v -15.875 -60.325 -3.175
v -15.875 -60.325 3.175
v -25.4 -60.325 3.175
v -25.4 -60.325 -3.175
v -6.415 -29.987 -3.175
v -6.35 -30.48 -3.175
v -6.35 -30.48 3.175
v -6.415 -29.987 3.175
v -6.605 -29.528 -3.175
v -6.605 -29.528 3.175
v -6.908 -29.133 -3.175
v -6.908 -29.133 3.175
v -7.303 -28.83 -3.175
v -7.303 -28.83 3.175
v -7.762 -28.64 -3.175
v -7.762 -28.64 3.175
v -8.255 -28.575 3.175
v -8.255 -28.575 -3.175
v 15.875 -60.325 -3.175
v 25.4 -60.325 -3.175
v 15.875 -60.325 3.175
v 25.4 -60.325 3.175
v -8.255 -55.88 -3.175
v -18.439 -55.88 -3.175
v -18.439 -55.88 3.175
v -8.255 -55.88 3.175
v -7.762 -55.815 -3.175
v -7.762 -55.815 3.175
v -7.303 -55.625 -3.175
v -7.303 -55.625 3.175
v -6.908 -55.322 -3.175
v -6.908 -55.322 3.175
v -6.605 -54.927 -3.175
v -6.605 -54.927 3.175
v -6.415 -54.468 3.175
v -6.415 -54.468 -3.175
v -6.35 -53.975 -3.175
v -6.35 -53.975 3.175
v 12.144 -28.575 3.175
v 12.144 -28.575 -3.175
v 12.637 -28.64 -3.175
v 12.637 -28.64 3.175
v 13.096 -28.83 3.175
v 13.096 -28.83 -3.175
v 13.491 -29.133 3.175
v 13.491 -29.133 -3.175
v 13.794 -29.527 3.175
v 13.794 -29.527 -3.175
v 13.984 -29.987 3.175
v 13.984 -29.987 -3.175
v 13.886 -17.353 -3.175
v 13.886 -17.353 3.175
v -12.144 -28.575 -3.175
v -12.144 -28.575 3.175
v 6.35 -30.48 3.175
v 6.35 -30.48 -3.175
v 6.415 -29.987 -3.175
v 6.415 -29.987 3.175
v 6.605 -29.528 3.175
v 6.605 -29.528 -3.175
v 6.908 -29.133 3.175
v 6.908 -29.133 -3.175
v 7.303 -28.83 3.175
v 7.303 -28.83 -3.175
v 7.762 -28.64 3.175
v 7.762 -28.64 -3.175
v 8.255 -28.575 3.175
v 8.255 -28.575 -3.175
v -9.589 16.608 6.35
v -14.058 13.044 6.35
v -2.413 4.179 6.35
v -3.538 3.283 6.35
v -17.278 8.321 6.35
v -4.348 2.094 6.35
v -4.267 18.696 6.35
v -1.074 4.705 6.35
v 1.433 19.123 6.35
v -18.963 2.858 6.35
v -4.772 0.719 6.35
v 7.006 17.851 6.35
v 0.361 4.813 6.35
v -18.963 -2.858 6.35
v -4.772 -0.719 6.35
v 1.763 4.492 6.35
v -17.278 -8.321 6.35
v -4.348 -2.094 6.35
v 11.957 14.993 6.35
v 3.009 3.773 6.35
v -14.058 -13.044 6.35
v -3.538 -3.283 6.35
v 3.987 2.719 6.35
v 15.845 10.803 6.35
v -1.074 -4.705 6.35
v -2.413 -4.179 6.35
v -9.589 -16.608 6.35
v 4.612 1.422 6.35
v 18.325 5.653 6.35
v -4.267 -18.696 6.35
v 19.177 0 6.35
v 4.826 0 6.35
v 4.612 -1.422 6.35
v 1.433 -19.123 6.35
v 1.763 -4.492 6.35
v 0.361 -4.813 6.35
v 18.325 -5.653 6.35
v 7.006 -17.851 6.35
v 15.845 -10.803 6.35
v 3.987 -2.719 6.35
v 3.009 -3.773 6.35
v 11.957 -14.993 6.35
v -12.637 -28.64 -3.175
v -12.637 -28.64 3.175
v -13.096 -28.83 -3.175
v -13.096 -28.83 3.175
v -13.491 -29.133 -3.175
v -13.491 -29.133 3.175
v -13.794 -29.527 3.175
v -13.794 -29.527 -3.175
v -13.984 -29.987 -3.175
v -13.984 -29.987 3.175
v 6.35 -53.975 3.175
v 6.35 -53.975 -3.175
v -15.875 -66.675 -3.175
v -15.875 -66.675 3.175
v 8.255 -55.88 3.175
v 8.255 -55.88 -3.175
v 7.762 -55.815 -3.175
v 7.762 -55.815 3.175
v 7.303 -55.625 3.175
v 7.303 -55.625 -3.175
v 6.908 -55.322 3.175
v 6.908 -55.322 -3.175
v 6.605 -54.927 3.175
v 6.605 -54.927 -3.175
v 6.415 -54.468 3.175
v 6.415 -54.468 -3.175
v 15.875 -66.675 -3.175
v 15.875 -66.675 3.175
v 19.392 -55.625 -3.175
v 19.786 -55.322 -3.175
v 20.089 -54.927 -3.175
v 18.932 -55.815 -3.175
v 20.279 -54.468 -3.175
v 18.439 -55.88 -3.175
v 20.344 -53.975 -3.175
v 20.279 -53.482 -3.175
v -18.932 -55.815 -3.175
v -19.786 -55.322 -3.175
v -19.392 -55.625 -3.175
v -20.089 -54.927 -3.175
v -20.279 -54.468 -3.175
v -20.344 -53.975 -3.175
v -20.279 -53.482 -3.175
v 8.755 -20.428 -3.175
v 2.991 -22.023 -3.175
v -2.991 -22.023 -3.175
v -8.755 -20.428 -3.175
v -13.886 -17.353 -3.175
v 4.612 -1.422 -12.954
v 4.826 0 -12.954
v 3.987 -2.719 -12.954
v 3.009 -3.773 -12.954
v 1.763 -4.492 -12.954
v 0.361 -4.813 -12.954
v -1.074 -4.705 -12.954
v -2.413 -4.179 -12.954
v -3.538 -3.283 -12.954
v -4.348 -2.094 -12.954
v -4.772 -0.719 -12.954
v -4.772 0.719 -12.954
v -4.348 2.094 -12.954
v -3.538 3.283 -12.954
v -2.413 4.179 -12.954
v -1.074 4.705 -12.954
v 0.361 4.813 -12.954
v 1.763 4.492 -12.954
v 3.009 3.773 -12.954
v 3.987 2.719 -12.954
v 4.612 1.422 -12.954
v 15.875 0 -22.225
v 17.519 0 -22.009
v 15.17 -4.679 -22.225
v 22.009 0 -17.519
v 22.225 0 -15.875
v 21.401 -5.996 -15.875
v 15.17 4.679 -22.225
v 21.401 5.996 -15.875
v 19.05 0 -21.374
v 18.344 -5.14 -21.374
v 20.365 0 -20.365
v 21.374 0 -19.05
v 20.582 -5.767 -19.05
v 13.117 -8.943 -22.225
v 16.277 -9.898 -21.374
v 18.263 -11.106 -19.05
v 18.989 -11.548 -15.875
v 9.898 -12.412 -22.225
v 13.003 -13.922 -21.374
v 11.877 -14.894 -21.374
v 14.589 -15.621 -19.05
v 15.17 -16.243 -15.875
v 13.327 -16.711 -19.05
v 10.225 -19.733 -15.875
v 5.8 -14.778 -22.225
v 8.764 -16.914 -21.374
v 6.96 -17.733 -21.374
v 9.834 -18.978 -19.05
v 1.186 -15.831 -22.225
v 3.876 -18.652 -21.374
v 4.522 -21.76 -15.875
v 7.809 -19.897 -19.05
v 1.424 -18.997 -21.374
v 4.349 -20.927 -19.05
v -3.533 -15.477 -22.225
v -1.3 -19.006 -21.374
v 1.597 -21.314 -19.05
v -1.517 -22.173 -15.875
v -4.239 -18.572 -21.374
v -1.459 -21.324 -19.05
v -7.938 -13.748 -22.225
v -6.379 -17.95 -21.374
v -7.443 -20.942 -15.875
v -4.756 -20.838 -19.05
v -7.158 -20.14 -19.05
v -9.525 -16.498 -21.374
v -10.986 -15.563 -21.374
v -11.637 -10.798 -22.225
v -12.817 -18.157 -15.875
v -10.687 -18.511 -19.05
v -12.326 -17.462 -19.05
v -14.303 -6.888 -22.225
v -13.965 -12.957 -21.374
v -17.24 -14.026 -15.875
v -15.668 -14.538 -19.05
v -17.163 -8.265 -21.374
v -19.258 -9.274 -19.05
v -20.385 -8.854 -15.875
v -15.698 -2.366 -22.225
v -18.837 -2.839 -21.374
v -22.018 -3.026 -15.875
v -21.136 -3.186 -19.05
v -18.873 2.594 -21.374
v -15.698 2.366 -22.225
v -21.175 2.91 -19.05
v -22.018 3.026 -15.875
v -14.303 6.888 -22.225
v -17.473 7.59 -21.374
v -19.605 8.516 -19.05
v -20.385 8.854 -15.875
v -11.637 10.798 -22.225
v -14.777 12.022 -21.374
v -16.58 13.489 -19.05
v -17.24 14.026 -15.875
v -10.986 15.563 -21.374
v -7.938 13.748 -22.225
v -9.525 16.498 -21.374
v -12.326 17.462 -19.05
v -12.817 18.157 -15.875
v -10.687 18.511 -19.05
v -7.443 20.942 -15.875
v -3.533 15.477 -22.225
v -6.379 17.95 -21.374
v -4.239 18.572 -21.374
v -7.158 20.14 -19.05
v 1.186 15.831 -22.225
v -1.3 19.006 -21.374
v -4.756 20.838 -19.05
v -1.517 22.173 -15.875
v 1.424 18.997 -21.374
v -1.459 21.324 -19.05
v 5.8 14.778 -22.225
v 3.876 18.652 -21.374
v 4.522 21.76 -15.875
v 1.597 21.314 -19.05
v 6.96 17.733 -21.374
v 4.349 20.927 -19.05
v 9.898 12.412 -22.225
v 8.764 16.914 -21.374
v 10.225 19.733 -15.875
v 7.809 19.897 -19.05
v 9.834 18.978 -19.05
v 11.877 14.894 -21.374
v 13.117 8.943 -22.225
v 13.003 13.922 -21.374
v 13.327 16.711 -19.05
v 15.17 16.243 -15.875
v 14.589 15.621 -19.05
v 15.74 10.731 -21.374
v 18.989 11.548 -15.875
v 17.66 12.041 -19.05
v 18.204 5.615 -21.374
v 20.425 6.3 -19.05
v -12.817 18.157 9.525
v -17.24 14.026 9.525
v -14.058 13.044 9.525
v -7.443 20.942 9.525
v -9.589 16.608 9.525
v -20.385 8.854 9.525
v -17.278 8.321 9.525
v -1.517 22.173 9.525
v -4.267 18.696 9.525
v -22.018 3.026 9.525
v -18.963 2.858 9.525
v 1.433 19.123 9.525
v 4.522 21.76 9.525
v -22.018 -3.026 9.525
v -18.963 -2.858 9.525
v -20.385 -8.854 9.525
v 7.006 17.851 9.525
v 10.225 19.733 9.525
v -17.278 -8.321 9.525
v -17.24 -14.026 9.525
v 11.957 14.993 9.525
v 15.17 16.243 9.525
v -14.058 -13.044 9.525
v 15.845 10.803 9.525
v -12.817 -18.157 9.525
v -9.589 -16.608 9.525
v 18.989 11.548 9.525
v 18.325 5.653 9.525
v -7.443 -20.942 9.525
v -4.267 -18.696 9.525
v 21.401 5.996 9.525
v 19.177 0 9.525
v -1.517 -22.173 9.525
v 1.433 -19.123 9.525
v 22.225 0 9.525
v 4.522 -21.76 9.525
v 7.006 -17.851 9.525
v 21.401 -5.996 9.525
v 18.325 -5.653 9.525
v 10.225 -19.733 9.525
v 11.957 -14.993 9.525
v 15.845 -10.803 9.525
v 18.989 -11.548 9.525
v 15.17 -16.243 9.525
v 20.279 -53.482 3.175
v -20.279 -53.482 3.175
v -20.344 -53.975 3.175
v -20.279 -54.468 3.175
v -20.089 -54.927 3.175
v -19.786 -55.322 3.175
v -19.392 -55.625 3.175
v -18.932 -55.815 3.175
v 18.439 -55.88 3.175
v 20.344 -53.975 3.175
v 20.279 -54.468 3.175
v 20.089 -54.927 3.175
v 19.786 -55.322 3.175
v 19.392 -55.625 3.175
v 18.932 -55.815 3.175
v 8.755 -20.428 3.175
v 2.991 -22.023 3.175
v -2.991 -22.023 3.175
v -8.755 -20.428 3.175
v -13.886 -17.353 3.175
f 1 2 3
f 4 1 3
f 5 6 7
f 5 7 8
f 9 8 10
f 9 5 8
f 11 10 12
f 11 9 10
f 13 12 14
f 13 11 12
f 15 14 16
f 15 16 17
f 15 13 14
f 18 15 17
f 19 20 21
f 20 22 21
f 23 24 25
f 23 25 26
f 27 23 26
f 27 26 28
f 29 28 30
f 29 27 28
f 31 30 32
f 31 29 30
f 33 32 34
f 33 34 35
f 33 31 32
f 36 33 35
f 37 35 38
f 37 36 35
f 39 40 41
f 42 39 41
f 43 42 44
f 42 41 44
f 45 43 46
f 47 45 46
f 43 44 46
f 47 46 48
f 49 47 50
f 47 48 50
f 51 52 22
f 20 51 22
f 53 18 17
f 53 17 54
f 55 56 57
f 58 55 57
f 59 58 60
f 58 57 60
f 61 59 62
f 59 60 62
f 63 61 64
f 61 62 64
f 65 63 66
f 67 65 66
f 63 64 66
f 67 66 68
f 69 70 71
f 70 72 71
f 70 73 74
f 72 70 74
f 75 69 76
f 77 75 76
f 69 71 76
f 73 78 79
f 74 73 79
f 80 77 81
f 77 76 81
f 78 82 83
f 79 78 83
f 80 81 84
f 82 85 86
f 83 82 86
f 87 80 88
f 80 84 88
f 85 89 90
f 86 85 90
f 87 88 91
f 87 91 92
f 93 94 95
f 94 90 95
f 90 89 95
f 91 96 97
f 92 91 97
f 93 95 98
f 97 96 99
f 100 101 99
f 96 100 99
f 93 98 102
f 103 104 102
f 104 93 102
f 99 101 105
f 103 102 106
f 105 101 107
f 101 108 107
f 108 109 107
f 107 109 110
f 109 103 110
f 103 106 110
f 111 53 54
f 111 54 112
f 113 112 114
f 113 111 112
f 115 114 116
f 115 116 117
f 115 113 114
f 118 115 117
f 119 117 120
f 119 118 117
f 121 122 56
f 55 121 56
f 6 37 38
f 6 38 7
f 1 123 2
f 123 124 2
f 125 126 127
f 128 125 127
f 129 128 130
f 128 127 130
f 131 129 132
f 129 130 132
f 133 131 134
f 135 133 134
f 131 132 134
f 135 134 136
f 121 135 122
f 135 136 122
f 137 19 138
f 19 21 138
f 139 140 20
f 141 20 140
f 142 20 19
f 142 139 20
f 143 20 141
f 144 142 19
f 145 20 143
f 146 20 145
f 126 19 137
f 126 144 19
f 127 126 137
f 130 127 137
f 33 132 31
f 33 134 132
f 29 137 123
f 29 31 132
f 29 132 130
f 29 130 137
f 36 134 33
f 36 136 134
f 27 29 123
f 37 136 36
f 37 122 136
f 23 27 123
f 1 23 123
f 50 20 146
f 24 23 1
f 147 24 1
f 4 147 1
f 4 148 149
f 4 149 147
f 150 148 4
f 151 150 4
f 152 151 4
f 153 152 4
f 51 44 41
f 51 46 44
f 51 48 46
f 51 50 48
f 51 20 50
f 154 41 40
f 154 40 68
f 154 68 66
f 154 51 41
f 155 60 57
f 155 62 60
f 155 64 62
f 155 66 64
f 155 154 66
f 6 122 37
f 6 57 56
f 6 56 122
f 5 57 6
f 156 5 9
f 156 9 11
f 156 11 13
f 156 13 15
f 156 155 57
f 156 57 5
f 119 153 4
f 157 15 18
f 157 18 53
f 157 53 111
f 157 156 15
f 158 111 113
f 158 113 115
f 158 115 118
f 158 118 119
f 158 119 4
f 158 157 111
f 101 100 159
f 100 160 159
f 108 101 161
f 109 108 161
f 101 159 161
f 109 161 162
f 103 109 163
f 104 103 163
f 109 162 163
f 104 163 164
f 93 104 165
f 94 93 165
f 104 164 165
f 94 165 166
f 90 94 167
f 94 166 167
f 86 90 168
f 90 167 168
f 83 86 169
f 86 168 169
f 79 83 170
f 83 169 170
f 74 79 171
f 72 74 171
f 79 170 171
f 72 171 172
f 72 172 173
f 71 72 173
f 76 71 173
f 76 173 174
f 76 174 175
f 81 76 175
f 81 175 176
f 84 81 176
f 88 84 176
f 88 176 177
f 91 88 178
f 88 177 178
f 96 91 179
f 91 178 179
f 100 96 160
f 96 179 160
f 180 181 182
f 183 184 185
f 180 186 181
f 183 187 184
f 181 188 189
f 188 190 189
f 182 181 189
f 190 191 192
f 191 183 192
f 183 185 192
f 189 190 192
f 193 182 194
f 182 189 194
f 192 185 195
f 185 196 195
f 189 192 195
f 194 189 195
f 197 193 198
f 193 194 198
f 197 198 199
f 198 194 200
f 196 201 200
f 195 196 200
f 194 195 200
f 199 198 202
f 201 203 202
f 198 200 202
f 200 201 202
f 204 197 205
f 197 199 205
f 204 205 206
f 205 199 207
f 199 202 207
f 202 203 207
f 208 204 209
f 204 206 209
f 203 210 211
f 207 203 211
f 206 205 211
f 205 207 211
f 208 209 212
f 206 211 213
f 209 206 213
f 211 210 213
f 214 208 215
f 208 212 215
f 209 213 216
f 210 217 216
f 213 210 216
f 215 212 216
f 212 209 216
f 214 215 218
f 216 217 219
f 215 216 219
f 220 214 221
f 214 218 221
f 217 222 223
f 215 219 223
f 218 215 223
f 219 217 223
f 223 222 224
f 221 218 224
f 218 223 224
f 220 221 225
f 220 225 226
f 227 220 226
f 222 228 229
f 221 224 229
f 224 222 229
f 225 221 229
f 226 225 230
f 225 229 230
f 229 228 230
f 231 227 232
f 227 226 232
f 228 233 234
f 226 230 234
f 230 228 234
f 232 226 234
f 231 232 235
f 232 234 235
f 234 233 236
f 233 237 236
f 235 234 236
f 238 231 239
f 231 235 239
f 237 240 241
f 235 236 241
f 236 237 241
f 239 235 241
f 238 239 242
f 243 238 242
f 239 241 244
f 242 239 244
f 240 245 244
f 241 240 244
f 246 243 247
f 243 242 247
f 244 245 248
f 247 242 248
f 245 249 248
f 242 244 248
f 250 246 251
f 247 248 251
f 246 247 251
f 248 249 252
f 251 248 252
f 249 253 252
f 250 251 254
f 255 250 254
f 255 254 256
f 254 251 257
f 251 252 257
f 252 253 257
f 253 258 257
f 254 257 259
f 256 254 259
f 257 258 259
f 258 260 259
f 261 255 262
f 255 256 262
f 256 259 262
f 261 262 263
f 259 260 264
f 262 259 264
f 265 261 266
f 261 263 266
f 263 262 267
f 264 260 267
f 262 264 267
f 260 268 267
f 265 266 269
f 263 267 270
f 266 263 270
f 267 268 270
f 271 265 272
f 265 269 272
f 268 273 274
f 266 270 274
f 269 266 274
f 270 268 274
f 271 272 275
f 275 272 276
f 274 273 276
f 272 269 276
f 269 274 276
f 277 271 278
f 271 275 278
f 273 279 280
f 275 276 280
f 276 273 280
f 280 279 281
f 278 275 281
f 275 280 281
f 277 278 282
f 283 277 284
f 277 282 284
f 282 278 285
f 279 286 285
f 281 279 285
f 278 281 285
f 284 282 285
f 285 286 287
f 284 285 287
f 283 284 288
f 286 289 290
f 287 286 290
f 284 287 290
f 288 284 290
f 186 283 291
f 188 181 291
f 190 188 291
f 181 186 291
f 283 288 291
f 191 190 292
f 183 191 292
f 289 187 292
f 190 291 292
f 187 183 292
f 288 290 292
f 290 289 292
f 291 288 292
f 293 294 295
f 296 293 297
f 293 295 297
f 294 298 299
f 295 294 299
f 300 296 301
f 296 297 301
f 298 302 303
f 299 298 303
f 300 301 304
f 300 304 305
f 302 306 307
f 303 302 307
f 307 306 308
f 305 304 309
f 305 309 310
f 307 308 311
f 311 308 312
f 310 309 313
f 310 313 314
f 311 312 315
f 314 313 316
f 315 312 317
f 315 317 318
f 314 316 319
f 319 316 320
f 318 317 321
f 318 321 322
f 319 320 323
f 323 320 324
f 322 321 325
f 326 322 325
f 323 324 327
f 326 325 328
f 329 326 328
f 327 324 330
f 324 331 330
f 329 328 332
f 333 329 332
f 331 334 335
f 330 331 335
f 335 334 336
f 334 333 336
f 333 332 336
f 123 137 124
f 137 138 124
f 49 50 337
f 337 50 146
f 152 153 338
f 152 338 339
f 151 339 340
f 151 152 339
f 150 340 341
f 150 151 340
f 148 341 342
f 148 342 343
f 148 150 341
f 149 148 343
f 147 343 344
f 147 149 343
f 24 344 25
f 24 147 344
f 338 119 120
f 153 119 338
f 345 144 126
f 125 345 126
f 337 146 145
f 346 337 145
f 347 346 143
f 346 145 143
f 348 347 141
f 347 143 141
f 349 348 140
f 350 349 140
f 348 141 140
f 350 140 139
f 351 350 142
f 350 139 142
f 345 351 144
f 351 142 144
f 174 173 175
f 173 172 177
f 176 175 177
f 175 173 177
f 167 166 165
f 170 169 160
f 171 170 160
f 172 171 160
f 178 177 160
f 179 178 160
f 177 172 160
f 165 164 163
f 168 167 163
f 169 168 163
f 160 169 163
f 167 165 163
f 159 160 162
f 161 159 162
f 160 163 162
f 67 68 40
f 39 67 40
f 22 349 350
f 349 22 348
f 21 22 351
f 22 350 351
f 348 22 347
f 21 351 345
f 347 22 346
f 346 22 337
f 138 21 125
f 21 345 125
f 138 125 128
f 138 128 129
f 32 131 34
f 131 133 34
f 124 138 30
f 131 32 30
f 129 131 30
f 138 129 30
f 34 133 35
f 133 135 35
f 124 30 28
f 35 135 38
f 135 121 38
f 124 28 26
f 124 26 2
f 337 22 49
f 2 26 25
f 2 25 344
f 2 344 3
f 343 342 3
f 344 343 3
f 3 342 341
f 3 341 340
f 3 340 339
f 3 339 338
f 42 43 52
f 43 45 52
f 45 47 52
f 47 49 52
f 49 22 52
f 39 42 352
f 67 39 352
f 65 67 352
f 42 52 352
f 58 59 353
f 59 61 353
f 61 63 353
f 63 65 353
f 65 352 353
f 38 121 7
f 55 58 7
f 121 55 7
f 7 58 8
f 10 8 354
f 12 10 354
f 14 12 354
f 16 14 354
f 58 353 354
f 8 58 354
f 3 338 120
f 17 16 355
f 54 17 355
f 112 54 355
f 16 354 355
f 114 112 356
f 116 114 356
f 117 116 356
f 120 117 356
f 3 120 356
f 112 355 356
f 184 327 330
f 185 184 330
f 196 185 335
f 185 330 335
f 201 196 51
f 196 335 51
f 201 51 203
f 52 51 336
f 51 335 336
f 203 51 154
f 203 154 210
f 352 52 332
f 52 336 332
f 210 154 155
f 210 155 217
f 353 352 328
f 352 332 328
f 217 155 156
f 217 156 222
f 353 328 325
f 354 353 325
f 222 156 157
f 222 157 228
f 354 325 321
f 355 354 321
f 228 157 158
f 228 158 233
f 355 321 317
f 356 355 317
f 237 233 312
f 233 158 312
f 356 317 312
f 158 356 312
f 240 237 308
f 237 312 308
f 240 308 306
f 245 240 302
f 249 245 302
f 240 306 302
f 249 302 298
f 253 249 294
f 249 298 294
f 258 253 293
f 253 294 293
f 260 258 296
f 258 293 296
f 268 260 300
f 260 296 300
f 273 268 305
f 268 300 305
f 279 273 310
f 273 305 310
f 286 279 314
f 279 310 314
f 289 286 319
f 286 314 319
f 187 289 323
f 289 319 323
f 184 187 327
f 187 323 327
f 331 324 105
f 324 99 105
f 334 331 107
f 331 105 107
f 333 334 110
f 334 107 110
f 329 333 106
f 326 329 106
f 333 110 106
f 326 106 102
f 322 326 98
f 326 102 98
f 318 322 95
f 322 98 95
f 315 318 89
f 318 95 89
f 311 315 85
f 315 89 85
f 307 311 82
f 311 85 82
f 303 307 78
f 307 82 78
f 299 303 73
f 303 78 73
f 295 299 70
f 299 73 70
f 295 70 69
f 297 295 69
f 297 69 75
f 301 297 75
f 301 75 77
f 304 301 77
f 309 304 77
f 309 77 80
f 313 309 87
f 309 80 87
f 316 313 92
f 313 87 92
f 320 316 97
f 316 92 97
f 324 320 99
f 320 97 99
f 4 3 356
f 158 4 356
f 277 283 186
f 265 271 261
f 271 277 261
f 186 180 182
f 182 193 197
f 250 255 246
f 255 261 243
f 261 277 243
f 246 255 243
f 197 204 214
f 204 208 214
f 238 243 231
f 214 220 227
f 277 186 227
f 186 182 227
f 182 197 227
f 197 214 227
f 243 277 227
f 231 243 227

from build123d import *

# Parameters (mm, degrees)
BOSS_EXTRUDE1_DEPTH = 3.175
CUT_EXTRUDE1_DEPTH  = 6.35


with BuildPart() as part:
    # Sketch2 → Boss-Extrude1 (new, symmetric)
    with BuildSketch(Plane.XY):
        Polygon((-9.235964967, 0), (9.235964967, 0), (25.4, -60.325), (15.875, -60.325), (15.875, -66.675), (-15.875, -66.675), (-15.875, -60.325), (-25.4, -60.325), align=None)
    extrude(amount=BOSS_EXTRUDE1_DEPTH, both=True)

    # Sketch3 → Revolve1 (revolve)
    with BuildSketch(Plane(origin=(0, 0, 0), x_dir=(0, 0, -1), z_dir=(1, 0, 0)), mode=Mode.PRIVATE) as revolve1_sk:
        with BuildLine():
            Line((22.225, 0), (22.225, 15.875))
            ThreePointArc((22.225, 15.875), (20.365128061, 20.365128061), (15.875, 22.225))
            Line((15.875, 22.225), (-9.525, 22.225))
            Line((-9.525, 22.225), (-9.525, 0))
            Line((-9.525, 0), (0, 0))
            Line((0, 0), (22.225, 0))
        make_face()
    revolve(revolve1_sk.sketch.rotate(Axis((0, 0, 0), (0, 0, -1)), 90), axis=Axis((0, 0, 0), (0, 0, -1)))

    # Sketch5 → Cut-Revolve1 (revolve, cut)
    with BuildSketch(Plane(origin=(0, 0, 0), x_dir=(0, 0, -1), z_dir=(1, 0, 0)), mode=Mode.PRIVATE) as cut_revolve1_sk:
        Polygon((-9.525, 19.177), (-6.35, 19.177), (-6.35, 4.826), (12.954, 4.826), (12.954, 0), (-9.525, 0), align=None)
    revolve(cut_revolve1_sk.sketch.rotate(Axis((0, 0, 9.525), (0, 0, -1)), 90), axis=Axis((0, 0, 9.525), (0, 0, -1)), mode=Mode.SUBTRACT)

    # Sketch6 → Cut-Extrude1 (cut)
    with BuildSketch(Plane(origin=(0, 0, -3.175), x_dir=(-1, 0, 0), z_dir=(0, 0, -1))):
        with BuildLine():
            Line((-13.983942054, -29.986949719), (-20.279408331, -53.481949719))
            ThreePointArc((-20.279408331, -53.481949719), (-19.950657745, -55.134690522), (-18.439319632, -55.88))
            Line((-18.439319632, -55.88), (-8.255, -55.88))
            ThreePointArc((-8.255, -55.88), (-6.907961582, -55.322038418), (-6.35, -53.975))
            Line((-6.35, -53.975), (-6.35, -30.48))
            ThreePointArc((-6.35, -30.48), (-6.907961582, -29.132961582), (-8.255, -28.575))
            Line((-8.255, -28.575), (-12.143853355, -28.575))
            ThreePointArc((-12.143853355, -28.575), (-13.303543878, -28.968661887), (-13.983942054, -29.986949719))
        make_face()
        with BuildLine():
            Line((8.255, -28.575), (12.143853355, -28.575))
            ThreePointArc((12.143853355, -28.575), (13.303543878, -28.968661887), (13.983942054, -29.986949719))
            Line((13.983942054, -29.986949719), (20.279408331, -53.481949719))
            ThreePointArc((20.279408331, -53.481949719), (19.950657745, -55.134690522), (18.439319632, -55.88))
            Line((18.439319632, -55.88), (8.255, -55.88))
            ThreePointArc((8.255, -55.88), (6.907961582, -55.322038418), (6.35, -53.975))
            Line((6.35, -53.975), (6.35, -30.48))
            ThreePointArc((6.35, -30.48), (6.907961582, -29.132961582), (8.255, -28.575))
        make_face()
    extrude(amount=-CUT_EXTRUDE1_DEPTH, mode=Mode.SUBTRACT)


solid = part.part
